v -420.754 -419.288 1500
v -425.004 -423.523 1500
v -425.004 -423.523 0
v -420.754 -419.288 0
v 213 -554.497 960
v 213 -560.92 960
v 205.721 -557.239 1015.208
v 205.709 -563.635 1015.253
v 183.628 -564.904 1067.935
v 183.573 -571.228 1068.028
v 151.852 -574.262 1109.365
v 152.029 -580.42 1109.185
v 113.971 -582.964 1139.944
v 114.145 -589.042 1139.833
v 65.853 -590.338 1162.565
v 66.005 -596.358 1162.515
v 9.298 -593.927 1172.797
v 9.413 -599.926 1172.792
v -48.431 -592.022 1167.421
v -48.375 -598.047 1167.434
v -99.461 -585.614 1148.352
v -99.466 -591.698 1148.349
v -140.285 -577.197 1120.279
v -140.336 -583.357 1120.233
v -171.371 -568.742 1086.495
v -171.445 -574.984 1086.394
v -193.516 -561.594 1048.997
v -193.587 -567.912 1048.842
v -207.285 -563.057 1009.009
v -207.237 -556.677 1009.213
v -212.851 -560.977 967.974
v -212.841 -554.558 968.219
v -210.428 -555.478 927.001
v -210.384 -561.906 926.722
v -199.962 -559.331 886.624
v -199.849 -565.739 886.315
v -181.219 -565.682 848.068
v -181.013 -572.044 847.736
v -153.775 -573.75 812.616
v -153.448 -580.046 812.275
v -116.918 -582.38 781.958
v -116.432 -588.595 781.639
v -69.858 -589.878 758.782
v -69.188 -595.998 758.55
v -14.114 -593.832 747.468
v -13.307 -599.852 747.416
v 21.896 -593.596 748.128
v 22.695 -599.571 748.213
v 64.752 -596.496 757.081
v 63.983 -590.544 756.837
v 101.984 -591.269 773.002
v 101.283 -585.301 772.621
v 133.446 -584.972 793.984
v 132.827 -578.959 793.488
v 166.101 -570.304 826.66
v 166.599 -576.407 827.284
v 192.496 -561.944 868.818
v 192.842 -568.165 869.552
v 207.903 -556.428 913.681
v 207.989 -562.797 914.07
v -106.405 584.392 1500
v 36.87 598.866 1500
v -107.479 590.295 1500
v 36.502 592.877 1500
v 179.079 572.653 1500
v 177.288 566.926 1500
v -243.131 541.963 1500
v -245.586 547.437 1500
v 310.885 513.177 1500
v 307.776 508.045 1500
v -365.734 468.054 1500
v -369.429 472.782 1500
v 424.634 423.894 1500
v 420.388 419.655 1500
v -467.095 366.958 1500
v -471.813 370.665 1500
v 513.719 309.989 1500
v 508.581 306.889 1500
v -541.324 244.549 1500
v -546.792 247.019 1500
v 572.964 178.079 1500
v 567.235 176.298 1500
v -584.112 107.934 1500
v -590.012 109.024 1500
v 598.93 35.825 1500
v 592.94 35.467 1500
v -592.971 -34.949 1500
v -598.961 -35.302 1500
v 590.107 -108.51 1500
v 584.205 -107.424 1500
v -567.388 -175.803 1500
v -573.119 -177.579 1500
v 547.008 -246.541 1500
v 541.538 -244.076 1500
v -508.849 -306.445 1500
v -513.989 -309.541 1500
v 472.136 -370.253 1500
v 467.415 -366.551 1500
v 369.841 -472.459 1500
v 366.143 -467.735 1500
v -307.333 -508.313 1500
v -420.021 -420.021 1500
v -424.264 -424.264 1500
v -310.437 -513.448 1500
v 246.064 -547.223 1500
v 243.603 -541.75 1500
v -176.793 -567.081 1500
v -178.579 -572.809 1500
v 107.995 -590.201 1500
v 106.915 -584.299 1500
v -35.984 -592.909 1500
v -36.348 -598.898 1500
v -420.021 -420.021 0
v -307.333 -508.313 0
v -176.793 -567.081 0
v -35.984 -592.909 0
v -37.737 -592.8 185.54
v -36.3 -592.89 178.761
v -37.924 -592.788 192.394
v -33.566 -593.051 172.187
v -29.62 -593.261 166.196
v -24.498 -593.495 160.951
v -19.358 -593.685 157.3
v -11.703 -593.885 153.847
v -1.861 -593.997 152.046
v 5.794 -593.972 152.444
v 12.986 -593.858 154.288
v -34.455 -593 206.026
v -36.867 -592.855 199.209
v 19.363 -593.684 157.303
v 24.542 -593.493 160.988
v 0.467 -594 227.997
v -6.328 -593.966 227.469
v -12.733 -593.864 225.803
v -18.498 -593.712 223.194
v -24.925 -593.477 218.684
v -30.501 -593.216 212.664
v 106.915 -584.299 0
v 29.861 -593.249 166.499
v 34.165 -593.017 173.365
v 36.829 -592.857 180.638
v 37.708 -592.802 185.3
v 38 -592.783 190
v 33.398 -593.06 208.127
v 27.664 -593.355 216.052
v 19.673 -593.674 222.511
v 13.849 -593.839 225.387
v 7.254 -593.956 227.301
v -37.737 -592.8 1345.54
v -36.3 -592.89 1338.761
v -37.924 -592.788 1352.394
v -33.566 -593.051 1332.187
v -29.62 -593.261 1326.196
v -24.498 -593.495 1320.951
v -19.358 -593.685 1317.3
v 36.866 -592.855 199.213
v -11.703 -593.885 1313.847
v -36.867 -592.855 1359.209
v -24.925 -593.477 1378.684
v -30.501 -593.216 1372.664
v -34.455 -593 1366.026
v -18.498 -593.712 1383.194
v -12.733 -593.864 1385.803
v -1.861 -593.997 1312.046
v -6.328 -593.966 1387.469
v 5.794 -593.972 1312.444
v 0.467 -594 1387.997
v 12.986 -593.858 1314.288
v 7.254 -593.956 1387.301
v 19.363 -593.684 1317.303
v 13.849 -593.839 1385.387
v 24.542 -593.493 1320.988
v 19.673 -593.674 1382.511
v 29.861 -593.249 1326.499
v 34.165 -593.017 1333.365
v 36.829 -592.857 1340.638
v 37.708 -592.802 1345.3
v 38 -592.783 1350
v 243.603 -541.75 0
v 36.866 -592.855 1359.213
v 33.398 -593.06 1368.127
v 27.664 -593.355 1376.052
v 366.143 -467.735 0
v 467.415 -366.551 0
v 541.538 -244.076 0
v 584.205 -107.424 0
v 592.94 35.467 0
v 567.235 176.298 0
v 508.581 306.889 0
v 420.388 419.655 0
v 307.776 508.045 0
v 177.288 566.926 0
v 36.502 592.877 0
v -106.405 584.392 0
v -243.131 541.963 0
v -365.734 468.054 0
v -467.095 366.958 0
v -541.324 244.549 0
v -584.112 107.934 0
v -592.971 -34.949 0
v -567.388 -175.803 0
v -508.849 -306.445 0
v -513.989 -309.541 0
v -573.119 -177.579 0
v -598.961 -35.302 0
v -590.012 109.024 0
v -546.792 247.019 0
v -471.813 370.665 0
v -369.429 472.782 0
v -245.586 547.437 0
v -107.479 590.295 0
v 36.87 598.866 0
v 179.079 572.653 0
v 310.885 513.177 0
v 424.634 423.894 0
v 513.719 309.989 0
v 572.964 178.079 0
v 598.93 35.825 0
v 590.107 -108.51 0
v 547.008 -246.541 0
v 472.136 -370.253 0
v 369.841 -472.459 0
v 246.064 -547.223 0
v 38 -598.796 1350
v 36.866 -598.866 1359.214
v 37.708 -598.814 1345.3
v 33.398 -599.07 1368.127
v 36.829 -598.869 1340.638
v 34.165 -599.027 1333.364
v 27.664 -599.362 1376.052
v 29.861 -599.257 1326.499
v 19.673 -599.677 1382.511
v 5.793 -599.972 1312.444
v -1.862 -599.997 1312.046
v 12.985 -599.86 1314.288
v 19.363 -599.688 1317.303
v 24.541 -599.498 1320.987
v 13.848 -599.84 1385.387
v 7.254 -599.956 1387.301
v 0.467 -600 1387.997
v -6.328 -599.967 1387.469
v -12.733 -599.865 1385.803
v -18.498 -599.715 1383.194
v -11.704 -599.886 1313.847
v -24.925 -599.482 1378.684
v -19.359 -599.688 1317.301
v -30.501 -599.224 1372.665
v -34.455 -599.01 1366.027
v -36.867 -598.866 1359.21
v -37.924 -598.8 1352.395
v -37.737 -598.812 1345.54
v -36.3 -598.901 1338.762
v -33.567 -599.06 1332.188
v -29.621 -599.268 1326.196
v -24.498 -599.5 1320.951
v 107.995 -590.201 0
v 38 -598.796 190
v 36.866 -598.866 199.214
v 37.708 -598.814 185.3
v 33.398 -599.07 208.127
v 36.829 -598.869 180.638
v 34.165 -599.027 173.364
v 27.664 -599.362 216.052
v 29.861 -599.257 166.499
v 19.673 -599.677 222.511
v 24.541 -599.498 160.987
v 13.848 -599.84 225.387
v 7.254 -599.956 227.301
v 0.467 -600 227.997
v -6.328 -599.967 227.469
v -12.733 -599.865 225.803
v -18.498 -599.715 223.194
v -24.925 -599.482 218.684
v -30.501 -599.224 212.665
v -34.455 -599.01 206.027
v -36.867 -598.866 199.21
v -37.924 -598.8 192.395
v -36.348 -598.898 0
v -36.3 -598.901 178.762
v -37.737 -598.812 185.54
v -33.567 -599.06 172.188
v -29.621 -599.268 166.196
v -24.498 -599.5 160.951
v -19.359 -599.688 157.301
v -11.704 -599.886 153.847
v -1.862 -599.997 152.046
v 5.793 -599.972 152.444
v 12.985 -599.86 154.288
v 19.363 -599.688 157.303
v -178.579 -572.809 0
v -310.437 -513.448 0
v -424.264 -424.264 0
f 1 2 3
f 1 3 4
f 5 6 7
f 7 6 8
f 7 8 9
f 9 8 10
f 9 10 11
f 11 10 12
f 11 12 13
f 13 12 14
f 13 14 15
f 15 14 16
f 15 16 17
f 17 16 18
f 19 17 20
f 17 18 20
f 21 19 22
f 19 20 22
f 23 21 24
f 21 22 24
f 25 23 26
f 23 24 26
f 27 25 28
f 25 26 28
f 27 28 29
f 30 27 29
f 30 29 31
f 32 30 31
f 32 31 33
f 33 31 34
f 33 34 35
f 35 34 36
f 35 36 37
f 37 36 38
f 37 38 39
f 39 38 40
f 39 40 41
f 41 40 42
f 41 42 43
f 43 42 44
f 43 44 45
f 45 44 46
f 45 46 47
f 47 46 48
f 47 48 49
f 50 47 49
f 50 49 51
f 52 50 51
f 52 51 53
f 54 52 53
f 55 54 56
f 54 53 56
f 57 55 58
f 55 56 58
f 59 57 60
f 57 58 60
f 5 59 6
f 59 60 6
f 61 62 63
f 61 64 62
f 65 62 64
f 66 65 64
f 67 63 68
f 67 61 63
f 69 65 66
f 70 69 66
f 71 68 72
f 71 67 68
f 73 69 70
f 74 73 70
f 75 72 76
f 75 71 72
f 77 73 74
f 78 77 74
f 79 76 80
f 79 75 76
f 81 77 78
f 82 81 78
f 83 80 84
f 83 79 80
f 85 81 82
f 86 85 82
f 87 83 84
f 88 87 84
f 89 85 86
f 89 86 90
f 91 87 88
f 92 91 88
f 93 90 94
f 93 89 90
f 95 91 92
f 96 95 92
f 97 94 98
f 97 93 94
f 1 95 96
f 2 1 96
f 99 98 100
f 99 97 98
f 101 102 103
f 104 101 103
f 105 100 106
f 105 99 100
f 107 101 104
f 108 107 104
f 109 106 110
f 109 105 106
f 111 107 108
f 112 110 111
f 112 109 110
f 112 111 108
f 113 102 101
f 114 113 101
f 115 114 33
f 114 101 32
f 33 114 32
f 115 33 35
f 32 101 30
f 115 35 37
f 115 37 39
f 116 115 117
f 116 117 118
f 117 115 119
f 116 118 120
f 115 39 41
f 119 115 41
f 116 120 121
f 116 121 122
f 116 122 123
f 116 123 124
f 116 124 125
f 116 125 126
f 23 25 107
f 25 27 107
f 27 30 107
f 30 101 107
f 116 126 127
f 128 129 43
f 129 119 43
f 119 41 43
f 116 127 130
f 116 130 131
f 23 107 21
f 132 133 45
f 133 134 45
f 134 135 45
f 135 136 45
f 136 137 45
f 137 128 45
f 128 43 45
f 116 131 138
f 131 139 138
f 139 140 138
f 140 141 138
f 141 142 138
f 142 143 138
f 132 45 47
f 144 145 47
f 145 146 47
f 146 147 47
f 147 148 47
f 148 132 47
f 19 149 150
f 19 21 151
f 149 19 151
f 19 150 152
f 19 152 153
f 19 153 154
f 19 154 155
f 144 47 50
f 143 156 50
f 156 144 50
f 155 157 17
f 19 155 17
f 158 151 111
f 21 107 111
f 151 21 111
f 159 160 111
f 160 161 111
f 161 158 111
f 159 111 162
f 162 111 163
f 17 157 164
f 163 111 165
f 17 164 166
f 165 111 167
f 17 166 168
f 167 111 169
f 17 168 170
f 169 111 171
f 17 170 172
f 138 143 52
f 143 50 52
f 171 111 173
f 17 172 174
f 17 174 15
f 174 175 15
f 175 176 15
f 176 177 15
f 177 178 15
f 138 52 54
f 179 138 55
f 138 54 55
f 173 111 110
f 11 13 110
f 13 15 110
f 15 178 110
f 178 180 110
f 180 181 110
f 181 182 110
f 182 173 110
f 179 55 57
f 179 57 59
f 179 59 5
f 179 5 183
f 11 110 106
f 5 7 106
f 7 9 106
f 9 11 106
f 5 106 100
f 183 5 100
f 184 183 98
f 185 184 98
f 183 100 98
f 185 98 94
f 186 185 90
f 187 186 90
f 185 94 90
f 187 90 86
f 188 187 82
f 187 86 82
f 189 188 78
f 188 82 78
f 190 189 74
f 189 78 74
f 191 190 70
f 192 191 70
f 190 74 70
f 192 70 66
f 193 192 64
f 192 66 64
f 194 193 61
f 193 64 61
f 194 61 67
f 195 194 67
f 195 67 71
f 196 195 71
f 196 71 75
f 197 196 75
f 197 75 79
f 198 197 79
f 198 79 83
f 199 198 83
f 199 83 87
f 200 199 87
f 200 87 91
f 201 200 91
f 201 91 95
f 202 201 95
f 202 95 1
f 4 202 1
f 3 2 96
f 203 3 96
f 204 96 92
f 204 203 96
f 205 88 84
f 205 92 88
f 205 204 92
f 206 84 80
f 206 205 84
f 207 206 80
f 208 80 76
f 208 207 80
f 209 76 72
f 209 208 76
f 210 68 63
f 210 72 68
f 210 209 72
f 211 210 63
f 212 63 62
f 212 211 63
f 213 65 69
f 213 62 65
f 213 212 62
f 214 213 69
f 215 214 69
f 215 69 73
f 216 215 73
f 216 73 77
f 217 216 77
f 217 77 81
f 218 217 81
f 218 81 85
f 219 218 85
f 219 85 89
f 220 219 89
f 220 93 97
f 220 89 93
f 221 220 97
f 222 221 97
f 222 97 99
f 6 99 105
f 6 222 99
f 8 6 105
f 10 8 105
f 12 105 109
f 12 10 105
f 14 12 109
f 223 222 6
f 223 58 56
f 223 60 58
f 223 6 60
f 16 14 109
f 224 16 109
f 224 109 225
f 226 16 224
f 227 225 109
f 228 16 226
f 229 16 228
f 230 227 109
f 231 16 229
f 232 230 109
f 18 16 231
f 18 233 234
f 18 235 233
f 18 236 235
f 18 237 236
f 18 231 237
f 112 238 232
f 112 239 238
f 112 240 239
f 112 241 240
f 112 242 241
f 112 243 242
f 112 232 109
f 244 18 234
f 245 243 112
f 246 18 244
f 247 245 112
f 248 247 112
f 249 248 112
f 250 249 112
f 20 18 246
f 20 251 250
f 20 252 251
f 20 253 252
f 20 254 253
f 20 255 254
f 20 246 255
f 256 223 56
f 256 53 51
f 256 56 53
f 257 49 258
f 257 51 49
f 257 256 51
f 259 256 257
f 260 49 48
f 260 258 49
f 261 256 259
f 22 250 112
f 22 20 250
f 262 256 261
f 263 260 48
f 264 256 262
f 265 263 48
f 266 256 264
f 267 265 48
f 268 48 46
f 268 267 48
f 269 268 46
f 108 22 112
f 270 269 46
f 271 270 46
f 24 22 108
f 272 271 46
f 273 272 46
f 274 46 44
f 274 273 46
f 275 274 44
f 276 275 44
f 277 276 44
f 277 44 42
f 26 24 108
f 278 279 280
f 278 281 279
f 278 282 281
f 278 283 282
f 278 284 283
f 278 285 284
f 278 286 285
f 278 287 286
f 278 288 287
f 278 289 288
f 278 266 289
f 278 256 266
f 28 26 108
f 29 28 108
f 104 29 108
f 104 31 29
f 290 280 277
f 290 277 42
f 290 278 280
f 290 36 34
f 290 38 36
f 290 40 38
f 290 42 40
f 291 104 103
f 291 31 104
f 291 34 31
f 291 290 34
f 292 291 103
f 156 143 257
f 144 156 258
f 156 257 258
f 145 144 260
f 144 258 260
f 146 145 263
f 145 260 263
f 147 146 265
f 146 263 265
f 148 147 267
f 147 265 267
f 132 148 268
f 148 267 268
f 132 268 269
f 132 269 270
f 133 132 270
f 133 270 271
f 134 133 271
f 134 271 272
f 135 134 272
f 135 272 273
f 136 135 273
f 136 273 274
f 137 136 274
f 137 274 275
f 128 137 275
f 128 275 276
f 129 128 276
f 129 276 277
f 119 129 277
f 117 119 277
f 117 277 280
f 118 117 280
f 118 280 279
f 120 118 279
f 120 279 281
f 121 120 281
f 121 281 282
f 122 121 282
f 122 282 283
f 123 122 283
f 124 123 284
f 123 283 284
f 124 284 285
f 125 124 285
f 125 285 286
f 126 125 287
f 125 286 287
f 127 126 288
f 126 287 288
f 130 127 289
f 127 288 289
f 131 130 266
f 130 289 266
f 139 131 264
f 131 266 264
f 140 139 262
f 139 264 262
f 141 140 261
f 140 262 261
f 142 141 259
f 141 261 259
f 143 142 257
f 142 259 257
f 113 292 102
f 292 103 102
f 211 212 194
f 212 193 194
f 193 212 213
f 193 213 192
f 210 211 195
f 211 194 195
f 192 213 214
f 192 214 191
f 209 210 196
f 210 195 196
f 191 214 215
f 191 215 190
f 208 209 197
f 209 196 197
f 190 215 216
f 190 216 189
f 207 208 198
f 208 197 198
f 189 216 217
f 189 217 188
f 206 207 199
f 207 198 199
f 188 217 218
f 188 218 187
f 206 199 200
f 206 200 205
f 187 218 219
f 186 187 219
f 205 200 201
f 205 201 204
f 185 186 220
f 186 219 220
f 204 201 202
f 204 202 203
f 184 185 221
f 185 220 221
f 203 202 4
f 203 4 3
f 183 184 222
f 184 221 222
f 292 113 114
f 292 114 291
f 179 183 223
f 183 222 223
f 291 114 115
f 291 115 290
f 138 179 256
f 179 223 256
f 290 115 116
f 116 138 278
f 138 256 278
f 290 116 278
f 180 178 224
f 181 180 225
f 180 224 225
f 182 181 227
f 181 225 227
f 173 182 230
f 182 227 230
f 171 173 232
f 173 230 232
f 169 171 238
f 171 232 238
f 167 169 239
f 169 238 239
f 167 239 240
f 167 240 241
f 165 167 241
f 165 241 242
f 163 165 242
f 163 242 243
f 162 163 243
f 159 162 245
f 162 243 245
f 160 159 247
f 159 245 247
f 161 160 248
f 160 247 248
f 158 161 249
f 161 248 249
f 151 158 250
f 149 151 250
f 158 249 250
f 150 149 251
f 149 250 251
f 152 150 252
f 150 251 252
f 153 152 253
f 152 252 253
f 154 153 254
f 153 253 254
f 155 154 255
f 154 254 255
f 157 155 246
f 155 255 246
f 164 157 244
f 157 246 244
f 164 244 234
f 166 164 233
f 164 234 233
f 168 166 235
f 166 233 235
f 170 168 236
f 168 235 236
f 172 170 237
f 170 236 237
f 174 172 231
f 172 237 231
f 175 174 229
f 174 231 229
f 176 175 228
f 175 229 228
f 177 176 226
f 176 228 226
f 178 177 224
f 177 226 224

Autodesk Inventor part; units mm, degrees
sketch "floor angle sketch" plane through (0, 0, 0) normal (0, 0, 1) x (1, 0, 0)
  line L0 (0, 0) -> (0, -240.1382) construction
  line L1 (0, 0) -> (0, -1000)
  line L2 (-424.2641, -424.2641) -> (424.2641, 424.2641) construction
  circle A0 centre (0, 0) radius 600 construction
  line L3 (0, 0) -> (0, -800)
  line L4 (-38, -800) -> (38, -800)
  line L5 (-213, -1000) -> (213, -1000)
  line L6 (0, 0) -> (-307.8181, -845.7234)
  line L7 (0, 0) -> (0, -700)
  line L8 (-38, -700) -> (38, -700)
  line L9 (-368.8981, -823.492) -> (-246.7381, -867.9547)
  dimension "d51" = 1200
  dimension "d52" = 45
  dimension "d54" = 0
  dimension "d55" = 0
  dimension "d56" = 426
  dimension "d58" = 76
  dimension "d59" = 76
  dimension "d60" = 0
  dimension "d61" = 700
  dimension "d62" = 130
  dimension "d63" = 20
  dimension "d64" = 800
  dimension "d65" = 900
  dimension "d66" = 1000
ref_plane "SHELL Plane" through (-424.2641, -424.2641, 0) normal (0.7071, -0.7071, 0) x (0.7071, 0.7071, 0)
ref_plane "ACCESS Plane" through (-213, -1000, 0) normal (0, -1, 0) x (1, 0, 0)
ref_plane "OUTER Plane" through (-38, -800, 0) normal (0, -1, 0) x (1, 0, 0)
ref_plane "INNER Plane" through (-38, -700, 0) normal (0, -1, 0) x (1, 0, 0)
ref_plane "CHARGE Plane" through (-368.8981, -823.492, 0) normal (-0.342, -0.9397, 0) x (0.9397, -0.342, 0)
sketch "Sketch13" plane through (-424.2641, -424.2641, 0) normal (0.7071, -0.7071, 0) x (0.7071, 0.7071, 0)
  line L0 (600, 0) -> (600, 892.6829)
  line L1 (0, 0) -> (6, 0)
  line L2 (6, 0) -> (6, 1500)
  line L3 (6, 1500) -> (0, 1500)
  line L4 (0, 1500) -> (0, 0)
  dimension "d75" = 1500
  dimension "d76" = 6
  dimension "d77" = 1200
revolve "Revolution2" add sketch "Sketch13" angle 359.9 about axis through (0, 0, 0) along (0, 0, 1)
sketch "Sketch14" plane through (-213, -1000, 0) normal (0, -1, 0) x (1, 0, 0)
  circle A0 centre (213, 960) radius 213
  line L0 (813, 1500) -> (-387, 1500) projected
  point P0 (213, 0)
  point P1 (-211.2641, 1500)
  point P2 (-212.0039, 1500)
  dimension "d80" = 426
  dimension "d93" = 540
extrude "ACCESS" cut sketch "Sketch14" against normal up to next
sketch "Sketch15" plane through (-38, -700, 0) normal (0, -1, 0) x (1, 0, 0)
  circle A0 centre (38, 190) radius 38
  point P0 (38, 0)
  dimension "d84" = 76
  dimension "d85" = 190
extrude "INNER" cut sketch "Sketch15" against normal up to next
sketch "Sketch16" plane through (-38, -800, 0) normal (0, -1, 0) x (1, 0, 0)
  circle A0 centre (38, 1350) radius 38
  line L0 (638, 1500) -> (-562, 1500) projected
  point P0 (38, 0)
  point P1 (-386.2641, 1500)
  point P2 (-387.0039, 1500)
  dimension "d89" = 76
  dimension "d92" = 150
extrude "Extrusion9" cut sketch "Sketch16" against normal up to next
equation "\"BendRadius\" = Thickness"
equation "\"BendReliefWidth\" = Thickness"
equation "\"BendReliefDepth\" = 0.5 * Thickness"
equation "\"CornerReliefSize\" = 4 * Thickness"
equation "\"MinimumRemnant\" = 2 * Thickness"
equation "\"TransitionRadius\" = BendRadius"
equation "\"JacobiRadiusSize\" = BendRadius"
equation "\"GapSize\" = Thickness"
equation "\"Thickness\" = 6"
properties part number "TZS 1202 SHELL" material "Steel"
